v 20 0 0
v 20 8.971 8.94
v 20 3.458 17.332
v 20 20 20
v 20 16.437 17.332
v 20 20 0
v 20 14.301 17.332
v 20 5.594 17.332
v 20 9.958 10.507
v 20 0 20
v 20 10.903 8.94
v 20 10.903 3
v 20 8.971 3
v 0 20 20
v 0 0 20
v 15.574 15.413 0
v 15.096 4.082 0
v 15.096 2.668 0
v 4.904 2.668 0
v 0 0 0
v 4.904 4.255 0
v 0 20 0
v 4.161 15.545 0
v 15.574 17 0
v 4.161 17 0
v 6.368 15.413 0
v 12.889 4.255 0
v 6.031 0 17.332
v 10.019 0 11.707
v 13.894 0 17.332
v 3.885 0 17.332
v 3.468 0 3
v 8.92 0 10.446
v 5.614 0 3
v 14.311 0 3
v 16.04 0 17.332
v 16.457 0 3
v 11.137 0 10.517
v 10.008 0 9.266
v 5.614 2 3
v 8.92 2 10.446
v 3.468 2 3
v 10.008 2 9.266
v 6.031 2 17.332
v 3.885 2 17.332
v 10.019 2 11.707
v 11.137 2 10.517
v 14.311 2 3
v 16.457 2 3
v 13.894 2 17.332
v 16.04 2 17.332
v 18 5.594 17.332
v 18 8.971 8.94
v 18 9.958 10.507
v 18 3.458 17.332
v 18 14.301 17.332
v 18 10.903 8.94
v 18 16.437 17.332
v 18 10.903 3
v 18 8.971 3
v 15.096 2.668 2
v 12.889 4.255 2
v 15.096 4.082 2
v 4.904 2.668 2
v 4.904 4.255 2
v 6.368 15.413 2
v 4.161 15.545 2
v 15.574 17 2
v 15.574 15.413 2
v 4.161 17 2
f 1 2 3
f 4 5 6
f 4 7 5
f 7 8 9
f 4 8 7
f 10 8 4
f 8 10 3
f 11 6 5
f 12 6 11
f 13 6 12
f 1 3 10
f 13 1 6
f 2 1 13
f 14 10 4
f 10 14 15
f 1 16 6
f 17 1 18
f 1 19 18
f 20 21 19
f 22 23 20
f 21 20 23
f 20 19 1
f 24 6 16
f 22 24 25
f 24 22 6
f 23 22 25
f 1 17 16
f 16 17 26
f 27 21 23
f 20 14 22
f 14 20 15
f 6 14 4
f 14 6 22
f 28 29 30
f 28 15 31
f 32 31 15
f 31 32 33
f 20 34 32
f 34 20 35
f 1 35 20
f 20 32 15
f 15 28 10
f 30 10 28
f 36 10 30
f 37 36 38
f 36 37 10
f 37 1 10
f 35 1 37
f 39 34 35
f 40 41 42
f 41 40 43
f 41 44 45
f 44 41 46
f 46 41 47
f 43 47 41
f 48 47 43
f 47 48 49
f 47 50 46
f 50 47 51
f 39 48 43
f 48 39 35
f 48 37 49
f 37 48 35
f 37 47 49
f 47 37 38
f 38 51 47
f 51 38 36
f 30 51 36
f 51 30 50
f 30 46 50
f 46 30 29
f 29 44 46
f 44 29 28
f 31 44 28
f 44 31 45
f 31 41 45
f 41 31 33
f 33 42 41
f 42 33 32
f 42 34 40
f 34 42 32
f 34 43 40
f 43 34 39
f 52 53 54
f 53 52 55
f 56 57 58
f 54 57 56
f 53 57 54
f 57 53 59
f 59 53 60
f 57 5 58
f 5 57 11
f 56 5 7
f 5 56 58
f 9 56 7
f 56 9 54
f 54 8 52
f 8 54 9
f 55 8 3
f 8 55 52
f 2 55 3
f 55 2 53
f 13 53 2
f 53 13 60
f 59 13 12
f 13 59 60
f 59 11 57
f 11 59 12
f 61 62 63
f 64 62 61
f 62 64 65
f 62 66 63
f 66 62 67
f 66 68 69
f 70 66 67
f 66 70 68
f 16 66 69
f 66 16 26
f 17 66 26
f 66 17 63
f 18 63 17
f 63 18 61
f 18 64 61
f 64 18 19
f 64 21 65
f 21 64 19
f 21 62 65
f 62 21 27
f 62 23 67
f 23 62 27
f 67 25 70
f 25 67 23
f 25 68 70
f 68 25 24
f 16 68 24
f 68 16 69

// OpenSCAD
/*
 * XYZ Hollow Calibration Cube
 *
 * Rene K. Mueller <spiritdude@gmail.com>
 * 
 * Description:
 *    Printable with 0% infill: "Z" at the bottom
 *
 * History:
 * 2018/09/29: 0.0.1: first version
 */

difference() {
   cube(20);
   translate([3,2,3]) rotate([90,0,0]) scale(1.5) linear_extrude(height=2) text("X");
   translate([20-2,3,3]) rotate([90,0,90]) scale(1.5) linear_extrude(height=2) text("Y");
   translate([3.5,14+3,0]) rotate([0,0,0]) scale([1.5,-1.5,1]) linear_extrude(height=2) text("Z");
}
